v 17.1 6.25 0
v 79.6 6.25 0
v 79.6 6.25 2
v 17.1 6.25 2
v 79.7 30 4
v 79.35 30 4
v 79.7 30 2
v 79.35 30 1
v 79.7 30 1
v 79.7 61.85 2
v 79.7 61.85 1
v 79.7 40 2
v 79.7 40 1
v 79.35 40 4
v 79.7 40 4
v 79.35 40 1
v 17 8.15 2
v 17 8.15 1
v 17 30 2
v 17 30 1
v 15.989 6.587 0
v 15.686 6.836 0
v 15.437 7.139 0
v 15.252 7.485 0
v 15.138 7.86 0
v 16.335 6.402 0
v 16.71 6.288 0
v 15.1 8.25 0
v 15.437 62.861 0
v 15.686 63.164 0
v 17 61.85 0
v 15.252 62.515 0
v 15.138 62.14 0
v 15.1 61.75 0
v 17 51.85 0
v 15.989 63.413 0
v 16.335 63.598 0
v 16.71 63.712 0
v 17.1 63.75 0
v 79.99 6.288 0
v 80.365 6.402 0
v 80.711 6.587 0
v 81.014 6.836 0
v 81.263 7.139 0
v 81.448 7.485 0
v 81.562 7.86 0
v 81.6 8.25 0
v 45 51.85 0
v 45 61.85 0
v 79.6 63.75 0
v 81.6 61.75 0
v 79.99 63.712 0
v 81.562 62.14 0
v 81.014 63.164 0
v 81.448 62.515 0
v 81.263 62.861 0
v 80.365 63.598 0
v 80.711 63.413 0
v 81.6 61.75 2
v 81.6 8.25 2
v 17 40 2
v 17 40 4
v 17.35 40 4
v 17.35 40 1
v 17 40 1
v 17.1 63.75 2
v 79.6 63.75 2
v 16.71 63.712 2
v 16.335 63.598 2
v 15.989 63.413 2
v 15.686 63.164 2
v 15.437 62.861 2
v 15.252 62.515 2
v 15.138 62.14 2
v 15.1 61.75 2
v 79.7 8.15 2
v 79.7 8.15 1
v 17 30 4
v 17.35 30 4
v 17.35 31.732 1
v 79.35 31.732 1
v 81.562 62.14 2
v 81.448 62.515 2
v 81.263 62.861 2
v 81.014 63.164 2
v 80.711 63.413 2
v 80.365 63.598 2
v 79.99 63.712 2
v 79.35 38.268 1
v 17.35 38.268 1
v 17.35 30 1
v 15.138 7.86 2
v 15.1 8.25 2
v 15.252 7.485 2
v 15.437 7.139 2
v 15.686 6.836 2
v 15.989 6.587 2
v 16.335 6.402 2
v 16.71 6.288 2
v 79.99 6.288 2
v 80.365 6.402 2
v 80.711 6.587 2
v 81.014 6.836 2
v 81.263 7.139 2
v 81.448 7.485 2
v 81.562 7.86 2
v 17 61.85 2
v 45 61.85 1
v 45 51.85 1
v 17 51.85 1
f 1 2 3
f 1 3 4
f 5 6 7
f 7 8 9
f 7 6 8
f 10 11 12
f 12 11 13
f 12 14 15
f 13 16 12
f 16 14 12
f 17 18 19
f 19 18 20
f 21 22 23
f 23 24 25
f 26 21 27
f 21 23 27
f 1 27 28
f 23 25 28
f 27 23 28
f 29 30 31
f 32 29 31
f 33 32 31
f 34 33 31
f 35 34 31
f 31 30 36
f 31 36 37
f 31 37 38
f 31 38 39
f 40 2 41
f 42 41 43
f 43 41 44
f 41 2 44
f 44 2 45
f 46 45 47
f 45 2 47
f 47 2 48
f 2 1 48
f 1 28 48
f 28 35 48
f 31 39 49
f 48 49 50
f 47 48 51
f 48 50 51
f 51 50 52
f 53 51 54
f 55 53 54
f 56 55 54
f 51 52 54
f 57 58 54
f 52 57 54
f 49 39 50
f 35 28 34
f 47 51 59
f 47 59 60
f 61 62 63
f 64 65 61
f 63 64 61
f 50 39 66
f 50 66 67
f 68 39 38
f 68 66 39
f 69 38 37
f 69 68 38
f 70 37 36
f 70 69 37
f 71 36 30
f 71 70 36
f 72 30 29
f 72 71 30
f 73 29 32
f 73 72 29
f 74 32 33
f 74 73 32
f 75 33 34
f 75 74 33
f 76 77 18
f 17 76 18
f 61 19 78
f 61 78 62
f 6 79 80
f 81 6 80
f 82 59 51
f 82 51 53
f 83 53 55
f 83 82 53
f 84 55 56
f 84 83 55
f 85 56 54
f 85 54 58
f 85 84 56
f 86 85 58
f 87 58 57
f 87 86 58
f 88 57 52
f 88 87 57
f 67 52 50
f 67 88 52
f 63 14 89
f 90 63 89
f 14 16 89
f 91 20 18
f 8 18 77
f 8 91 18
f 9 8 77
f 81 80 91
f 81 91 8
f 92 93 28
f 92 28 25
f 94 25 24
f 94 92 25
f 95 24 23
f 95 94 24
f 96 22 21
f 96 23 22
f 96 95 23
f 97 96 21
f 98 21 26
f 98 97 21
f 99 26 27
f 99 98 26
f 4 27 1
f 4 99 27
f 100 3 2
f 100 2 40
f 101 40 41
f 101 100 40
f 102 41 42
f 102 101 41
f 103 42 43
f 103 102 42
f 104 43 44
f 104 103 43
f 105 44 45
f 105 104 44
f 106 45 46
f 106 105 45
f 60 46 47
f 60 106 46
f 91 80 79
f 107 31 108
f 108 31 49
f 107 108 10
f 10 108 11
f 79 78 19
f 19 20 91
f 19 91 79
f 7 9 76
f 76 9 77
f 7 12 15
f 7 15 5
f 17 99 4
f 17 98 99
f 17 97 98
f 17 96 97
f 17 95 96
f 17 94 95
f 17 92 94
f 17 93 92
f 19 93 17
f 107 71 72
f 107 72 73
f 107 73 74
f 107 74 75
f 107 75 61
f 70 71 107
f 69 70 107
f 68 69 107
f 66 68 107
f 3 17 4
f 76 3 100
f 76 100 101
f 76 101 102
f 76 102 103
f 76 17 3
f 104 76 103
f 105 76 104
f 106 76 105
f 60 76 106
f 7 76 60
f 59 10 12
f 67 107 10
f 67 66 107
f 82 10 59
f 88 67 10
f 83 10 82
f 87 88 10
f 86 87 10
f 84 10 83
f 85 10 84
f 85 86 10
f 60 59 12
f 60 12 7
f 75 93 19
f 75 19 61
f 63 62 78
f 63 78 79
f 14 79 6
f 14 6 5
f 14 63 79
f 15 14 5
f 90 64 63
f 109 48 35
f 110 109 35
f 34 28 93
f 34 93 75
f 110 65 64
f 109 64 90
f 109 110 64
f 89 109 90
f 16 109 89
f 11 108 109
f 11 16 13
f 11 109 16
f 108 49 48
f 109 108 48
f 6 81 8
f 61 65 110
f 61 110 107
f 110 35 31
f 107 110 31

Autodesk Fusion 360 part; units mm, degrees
sketch "Schizzo1" plane through (0, 0, 0) normal (0, 0, 1) x (1, 0, 0)
  line L0 (15, 63.85) -> (81.7, 63.85) construction
  line L1 (81.7, 63.85) -> (81.7, 6.15) construction
  line L2 (81.7, 6.15) -> (15, 6.15) construction
  line L3 (15, 6.15) -> (15, 63.85) construction
  line L4 (15, 35) -> (81.7, 35) construction
  line L5 (48.35, 63.85) -> (48.35, 6.15) construction
  line L6 (81.6, 6.25) -> (15.1, 6.25)
  line L7 (15.1, 6.25) -> (15.1, 63.75)
  line L8 (15.1, 63.75) -> (81.6, 63.75)
  line L9 (81.6, 63.75) -> (81.6, 6.25)
  line L10 (79.7, 8.15) -> (17, 8.15)
  line L11 (17, 8.15) -> (17, 61.85)
  line L12 (17, 61.85) -> (79.7, 61.85)
  line L13 (79.7, 61.85) -> (79.7, 8.15)
  line L14 (15.1, 40) -> (81.7, 40)
  line L15 (15.1, 30) -> (81.7, 30)
  line L16 (17, 61.85) -> (45, 61.85)
  line L17 (45, 61.85) -> (45, 51.85)
  line L18 (45, 51.85) -> (17, 51.85)
  line L19 (17, 51.85) -> (17, 61.85)
  dimension "d1" = 66.7
  dimension "d2" = 57.7
  dimension "d3" = 0.1
  dimension "d4" = 2
  dimension "d9" = 10
  dimension "d18" = 28
  dimension "d19" = 10
extrude "Estrusione1" add sketch "Schizzo1" along normal blind 1 contours L11 L13 L14 L15 | L10 L11 L13 L15 | L11 L12 L13 L14 L17 L18
extrude "Estrusione2" add sketch "Schizzo1" along normal blind 2 contours L6 L7 L9 L10 L11 L13 L15 | L9 L13 L14 L15 | L7 L11 L14 L15 | L7 L8 L9 L11 L12 L13 L14 L16 L19
fillet "Raccordo1" radius 2 4 edges at (81.6, 6.25, 1) (15.1, 6.25, 1) (81.6, 63.75, 1) (15.1, 63.75, 1)
extrude "Estrusione3" add sketch "Schizzo1" along normal blind 4 contours L11 L13 L14 L15
ref_plane "Piano di lavoro1" through (48.35, 35, 0) normal (-1, 0, 0) x (0, -1, 0)
sketch "Schizzo2" plane through (48.35, 0, 0) normal (-1, 0, 0) x (0, -1, 0)
  line L0 (-30, 4) -> (-40, 4) construction
  line L1 (-40, 4) -> (-40, 1) construction
  line L2 (-40, 1) -> (-30, 1) construction
  line L3 (-30, 1) -> (-30, 4) construction
  line L4 (-30, 1) -> (-30, 4)
  line L5 (-30, 4) -> (-31.7321, 1)
  line L6 (-31.7321, 1) -> (-30, 1)
  line L7 (-35, 4) -> (-35, 1) construction
  line L8 (-40, 4) -> (-38.2679, 1)
  line L9 (-40, 1) -> (-40, 4) construction
  line L10 (-38.2679, 1) -> (-40, 1)
  line L11 (-40, 1) -> (-40, 4)
  point P0 (-40, 1)
  point P1 (-30, 4)
  dimension "d15" = 30
extrude "Estrusione4" cut sketch "Schizzo2" along normal mid plane 62
